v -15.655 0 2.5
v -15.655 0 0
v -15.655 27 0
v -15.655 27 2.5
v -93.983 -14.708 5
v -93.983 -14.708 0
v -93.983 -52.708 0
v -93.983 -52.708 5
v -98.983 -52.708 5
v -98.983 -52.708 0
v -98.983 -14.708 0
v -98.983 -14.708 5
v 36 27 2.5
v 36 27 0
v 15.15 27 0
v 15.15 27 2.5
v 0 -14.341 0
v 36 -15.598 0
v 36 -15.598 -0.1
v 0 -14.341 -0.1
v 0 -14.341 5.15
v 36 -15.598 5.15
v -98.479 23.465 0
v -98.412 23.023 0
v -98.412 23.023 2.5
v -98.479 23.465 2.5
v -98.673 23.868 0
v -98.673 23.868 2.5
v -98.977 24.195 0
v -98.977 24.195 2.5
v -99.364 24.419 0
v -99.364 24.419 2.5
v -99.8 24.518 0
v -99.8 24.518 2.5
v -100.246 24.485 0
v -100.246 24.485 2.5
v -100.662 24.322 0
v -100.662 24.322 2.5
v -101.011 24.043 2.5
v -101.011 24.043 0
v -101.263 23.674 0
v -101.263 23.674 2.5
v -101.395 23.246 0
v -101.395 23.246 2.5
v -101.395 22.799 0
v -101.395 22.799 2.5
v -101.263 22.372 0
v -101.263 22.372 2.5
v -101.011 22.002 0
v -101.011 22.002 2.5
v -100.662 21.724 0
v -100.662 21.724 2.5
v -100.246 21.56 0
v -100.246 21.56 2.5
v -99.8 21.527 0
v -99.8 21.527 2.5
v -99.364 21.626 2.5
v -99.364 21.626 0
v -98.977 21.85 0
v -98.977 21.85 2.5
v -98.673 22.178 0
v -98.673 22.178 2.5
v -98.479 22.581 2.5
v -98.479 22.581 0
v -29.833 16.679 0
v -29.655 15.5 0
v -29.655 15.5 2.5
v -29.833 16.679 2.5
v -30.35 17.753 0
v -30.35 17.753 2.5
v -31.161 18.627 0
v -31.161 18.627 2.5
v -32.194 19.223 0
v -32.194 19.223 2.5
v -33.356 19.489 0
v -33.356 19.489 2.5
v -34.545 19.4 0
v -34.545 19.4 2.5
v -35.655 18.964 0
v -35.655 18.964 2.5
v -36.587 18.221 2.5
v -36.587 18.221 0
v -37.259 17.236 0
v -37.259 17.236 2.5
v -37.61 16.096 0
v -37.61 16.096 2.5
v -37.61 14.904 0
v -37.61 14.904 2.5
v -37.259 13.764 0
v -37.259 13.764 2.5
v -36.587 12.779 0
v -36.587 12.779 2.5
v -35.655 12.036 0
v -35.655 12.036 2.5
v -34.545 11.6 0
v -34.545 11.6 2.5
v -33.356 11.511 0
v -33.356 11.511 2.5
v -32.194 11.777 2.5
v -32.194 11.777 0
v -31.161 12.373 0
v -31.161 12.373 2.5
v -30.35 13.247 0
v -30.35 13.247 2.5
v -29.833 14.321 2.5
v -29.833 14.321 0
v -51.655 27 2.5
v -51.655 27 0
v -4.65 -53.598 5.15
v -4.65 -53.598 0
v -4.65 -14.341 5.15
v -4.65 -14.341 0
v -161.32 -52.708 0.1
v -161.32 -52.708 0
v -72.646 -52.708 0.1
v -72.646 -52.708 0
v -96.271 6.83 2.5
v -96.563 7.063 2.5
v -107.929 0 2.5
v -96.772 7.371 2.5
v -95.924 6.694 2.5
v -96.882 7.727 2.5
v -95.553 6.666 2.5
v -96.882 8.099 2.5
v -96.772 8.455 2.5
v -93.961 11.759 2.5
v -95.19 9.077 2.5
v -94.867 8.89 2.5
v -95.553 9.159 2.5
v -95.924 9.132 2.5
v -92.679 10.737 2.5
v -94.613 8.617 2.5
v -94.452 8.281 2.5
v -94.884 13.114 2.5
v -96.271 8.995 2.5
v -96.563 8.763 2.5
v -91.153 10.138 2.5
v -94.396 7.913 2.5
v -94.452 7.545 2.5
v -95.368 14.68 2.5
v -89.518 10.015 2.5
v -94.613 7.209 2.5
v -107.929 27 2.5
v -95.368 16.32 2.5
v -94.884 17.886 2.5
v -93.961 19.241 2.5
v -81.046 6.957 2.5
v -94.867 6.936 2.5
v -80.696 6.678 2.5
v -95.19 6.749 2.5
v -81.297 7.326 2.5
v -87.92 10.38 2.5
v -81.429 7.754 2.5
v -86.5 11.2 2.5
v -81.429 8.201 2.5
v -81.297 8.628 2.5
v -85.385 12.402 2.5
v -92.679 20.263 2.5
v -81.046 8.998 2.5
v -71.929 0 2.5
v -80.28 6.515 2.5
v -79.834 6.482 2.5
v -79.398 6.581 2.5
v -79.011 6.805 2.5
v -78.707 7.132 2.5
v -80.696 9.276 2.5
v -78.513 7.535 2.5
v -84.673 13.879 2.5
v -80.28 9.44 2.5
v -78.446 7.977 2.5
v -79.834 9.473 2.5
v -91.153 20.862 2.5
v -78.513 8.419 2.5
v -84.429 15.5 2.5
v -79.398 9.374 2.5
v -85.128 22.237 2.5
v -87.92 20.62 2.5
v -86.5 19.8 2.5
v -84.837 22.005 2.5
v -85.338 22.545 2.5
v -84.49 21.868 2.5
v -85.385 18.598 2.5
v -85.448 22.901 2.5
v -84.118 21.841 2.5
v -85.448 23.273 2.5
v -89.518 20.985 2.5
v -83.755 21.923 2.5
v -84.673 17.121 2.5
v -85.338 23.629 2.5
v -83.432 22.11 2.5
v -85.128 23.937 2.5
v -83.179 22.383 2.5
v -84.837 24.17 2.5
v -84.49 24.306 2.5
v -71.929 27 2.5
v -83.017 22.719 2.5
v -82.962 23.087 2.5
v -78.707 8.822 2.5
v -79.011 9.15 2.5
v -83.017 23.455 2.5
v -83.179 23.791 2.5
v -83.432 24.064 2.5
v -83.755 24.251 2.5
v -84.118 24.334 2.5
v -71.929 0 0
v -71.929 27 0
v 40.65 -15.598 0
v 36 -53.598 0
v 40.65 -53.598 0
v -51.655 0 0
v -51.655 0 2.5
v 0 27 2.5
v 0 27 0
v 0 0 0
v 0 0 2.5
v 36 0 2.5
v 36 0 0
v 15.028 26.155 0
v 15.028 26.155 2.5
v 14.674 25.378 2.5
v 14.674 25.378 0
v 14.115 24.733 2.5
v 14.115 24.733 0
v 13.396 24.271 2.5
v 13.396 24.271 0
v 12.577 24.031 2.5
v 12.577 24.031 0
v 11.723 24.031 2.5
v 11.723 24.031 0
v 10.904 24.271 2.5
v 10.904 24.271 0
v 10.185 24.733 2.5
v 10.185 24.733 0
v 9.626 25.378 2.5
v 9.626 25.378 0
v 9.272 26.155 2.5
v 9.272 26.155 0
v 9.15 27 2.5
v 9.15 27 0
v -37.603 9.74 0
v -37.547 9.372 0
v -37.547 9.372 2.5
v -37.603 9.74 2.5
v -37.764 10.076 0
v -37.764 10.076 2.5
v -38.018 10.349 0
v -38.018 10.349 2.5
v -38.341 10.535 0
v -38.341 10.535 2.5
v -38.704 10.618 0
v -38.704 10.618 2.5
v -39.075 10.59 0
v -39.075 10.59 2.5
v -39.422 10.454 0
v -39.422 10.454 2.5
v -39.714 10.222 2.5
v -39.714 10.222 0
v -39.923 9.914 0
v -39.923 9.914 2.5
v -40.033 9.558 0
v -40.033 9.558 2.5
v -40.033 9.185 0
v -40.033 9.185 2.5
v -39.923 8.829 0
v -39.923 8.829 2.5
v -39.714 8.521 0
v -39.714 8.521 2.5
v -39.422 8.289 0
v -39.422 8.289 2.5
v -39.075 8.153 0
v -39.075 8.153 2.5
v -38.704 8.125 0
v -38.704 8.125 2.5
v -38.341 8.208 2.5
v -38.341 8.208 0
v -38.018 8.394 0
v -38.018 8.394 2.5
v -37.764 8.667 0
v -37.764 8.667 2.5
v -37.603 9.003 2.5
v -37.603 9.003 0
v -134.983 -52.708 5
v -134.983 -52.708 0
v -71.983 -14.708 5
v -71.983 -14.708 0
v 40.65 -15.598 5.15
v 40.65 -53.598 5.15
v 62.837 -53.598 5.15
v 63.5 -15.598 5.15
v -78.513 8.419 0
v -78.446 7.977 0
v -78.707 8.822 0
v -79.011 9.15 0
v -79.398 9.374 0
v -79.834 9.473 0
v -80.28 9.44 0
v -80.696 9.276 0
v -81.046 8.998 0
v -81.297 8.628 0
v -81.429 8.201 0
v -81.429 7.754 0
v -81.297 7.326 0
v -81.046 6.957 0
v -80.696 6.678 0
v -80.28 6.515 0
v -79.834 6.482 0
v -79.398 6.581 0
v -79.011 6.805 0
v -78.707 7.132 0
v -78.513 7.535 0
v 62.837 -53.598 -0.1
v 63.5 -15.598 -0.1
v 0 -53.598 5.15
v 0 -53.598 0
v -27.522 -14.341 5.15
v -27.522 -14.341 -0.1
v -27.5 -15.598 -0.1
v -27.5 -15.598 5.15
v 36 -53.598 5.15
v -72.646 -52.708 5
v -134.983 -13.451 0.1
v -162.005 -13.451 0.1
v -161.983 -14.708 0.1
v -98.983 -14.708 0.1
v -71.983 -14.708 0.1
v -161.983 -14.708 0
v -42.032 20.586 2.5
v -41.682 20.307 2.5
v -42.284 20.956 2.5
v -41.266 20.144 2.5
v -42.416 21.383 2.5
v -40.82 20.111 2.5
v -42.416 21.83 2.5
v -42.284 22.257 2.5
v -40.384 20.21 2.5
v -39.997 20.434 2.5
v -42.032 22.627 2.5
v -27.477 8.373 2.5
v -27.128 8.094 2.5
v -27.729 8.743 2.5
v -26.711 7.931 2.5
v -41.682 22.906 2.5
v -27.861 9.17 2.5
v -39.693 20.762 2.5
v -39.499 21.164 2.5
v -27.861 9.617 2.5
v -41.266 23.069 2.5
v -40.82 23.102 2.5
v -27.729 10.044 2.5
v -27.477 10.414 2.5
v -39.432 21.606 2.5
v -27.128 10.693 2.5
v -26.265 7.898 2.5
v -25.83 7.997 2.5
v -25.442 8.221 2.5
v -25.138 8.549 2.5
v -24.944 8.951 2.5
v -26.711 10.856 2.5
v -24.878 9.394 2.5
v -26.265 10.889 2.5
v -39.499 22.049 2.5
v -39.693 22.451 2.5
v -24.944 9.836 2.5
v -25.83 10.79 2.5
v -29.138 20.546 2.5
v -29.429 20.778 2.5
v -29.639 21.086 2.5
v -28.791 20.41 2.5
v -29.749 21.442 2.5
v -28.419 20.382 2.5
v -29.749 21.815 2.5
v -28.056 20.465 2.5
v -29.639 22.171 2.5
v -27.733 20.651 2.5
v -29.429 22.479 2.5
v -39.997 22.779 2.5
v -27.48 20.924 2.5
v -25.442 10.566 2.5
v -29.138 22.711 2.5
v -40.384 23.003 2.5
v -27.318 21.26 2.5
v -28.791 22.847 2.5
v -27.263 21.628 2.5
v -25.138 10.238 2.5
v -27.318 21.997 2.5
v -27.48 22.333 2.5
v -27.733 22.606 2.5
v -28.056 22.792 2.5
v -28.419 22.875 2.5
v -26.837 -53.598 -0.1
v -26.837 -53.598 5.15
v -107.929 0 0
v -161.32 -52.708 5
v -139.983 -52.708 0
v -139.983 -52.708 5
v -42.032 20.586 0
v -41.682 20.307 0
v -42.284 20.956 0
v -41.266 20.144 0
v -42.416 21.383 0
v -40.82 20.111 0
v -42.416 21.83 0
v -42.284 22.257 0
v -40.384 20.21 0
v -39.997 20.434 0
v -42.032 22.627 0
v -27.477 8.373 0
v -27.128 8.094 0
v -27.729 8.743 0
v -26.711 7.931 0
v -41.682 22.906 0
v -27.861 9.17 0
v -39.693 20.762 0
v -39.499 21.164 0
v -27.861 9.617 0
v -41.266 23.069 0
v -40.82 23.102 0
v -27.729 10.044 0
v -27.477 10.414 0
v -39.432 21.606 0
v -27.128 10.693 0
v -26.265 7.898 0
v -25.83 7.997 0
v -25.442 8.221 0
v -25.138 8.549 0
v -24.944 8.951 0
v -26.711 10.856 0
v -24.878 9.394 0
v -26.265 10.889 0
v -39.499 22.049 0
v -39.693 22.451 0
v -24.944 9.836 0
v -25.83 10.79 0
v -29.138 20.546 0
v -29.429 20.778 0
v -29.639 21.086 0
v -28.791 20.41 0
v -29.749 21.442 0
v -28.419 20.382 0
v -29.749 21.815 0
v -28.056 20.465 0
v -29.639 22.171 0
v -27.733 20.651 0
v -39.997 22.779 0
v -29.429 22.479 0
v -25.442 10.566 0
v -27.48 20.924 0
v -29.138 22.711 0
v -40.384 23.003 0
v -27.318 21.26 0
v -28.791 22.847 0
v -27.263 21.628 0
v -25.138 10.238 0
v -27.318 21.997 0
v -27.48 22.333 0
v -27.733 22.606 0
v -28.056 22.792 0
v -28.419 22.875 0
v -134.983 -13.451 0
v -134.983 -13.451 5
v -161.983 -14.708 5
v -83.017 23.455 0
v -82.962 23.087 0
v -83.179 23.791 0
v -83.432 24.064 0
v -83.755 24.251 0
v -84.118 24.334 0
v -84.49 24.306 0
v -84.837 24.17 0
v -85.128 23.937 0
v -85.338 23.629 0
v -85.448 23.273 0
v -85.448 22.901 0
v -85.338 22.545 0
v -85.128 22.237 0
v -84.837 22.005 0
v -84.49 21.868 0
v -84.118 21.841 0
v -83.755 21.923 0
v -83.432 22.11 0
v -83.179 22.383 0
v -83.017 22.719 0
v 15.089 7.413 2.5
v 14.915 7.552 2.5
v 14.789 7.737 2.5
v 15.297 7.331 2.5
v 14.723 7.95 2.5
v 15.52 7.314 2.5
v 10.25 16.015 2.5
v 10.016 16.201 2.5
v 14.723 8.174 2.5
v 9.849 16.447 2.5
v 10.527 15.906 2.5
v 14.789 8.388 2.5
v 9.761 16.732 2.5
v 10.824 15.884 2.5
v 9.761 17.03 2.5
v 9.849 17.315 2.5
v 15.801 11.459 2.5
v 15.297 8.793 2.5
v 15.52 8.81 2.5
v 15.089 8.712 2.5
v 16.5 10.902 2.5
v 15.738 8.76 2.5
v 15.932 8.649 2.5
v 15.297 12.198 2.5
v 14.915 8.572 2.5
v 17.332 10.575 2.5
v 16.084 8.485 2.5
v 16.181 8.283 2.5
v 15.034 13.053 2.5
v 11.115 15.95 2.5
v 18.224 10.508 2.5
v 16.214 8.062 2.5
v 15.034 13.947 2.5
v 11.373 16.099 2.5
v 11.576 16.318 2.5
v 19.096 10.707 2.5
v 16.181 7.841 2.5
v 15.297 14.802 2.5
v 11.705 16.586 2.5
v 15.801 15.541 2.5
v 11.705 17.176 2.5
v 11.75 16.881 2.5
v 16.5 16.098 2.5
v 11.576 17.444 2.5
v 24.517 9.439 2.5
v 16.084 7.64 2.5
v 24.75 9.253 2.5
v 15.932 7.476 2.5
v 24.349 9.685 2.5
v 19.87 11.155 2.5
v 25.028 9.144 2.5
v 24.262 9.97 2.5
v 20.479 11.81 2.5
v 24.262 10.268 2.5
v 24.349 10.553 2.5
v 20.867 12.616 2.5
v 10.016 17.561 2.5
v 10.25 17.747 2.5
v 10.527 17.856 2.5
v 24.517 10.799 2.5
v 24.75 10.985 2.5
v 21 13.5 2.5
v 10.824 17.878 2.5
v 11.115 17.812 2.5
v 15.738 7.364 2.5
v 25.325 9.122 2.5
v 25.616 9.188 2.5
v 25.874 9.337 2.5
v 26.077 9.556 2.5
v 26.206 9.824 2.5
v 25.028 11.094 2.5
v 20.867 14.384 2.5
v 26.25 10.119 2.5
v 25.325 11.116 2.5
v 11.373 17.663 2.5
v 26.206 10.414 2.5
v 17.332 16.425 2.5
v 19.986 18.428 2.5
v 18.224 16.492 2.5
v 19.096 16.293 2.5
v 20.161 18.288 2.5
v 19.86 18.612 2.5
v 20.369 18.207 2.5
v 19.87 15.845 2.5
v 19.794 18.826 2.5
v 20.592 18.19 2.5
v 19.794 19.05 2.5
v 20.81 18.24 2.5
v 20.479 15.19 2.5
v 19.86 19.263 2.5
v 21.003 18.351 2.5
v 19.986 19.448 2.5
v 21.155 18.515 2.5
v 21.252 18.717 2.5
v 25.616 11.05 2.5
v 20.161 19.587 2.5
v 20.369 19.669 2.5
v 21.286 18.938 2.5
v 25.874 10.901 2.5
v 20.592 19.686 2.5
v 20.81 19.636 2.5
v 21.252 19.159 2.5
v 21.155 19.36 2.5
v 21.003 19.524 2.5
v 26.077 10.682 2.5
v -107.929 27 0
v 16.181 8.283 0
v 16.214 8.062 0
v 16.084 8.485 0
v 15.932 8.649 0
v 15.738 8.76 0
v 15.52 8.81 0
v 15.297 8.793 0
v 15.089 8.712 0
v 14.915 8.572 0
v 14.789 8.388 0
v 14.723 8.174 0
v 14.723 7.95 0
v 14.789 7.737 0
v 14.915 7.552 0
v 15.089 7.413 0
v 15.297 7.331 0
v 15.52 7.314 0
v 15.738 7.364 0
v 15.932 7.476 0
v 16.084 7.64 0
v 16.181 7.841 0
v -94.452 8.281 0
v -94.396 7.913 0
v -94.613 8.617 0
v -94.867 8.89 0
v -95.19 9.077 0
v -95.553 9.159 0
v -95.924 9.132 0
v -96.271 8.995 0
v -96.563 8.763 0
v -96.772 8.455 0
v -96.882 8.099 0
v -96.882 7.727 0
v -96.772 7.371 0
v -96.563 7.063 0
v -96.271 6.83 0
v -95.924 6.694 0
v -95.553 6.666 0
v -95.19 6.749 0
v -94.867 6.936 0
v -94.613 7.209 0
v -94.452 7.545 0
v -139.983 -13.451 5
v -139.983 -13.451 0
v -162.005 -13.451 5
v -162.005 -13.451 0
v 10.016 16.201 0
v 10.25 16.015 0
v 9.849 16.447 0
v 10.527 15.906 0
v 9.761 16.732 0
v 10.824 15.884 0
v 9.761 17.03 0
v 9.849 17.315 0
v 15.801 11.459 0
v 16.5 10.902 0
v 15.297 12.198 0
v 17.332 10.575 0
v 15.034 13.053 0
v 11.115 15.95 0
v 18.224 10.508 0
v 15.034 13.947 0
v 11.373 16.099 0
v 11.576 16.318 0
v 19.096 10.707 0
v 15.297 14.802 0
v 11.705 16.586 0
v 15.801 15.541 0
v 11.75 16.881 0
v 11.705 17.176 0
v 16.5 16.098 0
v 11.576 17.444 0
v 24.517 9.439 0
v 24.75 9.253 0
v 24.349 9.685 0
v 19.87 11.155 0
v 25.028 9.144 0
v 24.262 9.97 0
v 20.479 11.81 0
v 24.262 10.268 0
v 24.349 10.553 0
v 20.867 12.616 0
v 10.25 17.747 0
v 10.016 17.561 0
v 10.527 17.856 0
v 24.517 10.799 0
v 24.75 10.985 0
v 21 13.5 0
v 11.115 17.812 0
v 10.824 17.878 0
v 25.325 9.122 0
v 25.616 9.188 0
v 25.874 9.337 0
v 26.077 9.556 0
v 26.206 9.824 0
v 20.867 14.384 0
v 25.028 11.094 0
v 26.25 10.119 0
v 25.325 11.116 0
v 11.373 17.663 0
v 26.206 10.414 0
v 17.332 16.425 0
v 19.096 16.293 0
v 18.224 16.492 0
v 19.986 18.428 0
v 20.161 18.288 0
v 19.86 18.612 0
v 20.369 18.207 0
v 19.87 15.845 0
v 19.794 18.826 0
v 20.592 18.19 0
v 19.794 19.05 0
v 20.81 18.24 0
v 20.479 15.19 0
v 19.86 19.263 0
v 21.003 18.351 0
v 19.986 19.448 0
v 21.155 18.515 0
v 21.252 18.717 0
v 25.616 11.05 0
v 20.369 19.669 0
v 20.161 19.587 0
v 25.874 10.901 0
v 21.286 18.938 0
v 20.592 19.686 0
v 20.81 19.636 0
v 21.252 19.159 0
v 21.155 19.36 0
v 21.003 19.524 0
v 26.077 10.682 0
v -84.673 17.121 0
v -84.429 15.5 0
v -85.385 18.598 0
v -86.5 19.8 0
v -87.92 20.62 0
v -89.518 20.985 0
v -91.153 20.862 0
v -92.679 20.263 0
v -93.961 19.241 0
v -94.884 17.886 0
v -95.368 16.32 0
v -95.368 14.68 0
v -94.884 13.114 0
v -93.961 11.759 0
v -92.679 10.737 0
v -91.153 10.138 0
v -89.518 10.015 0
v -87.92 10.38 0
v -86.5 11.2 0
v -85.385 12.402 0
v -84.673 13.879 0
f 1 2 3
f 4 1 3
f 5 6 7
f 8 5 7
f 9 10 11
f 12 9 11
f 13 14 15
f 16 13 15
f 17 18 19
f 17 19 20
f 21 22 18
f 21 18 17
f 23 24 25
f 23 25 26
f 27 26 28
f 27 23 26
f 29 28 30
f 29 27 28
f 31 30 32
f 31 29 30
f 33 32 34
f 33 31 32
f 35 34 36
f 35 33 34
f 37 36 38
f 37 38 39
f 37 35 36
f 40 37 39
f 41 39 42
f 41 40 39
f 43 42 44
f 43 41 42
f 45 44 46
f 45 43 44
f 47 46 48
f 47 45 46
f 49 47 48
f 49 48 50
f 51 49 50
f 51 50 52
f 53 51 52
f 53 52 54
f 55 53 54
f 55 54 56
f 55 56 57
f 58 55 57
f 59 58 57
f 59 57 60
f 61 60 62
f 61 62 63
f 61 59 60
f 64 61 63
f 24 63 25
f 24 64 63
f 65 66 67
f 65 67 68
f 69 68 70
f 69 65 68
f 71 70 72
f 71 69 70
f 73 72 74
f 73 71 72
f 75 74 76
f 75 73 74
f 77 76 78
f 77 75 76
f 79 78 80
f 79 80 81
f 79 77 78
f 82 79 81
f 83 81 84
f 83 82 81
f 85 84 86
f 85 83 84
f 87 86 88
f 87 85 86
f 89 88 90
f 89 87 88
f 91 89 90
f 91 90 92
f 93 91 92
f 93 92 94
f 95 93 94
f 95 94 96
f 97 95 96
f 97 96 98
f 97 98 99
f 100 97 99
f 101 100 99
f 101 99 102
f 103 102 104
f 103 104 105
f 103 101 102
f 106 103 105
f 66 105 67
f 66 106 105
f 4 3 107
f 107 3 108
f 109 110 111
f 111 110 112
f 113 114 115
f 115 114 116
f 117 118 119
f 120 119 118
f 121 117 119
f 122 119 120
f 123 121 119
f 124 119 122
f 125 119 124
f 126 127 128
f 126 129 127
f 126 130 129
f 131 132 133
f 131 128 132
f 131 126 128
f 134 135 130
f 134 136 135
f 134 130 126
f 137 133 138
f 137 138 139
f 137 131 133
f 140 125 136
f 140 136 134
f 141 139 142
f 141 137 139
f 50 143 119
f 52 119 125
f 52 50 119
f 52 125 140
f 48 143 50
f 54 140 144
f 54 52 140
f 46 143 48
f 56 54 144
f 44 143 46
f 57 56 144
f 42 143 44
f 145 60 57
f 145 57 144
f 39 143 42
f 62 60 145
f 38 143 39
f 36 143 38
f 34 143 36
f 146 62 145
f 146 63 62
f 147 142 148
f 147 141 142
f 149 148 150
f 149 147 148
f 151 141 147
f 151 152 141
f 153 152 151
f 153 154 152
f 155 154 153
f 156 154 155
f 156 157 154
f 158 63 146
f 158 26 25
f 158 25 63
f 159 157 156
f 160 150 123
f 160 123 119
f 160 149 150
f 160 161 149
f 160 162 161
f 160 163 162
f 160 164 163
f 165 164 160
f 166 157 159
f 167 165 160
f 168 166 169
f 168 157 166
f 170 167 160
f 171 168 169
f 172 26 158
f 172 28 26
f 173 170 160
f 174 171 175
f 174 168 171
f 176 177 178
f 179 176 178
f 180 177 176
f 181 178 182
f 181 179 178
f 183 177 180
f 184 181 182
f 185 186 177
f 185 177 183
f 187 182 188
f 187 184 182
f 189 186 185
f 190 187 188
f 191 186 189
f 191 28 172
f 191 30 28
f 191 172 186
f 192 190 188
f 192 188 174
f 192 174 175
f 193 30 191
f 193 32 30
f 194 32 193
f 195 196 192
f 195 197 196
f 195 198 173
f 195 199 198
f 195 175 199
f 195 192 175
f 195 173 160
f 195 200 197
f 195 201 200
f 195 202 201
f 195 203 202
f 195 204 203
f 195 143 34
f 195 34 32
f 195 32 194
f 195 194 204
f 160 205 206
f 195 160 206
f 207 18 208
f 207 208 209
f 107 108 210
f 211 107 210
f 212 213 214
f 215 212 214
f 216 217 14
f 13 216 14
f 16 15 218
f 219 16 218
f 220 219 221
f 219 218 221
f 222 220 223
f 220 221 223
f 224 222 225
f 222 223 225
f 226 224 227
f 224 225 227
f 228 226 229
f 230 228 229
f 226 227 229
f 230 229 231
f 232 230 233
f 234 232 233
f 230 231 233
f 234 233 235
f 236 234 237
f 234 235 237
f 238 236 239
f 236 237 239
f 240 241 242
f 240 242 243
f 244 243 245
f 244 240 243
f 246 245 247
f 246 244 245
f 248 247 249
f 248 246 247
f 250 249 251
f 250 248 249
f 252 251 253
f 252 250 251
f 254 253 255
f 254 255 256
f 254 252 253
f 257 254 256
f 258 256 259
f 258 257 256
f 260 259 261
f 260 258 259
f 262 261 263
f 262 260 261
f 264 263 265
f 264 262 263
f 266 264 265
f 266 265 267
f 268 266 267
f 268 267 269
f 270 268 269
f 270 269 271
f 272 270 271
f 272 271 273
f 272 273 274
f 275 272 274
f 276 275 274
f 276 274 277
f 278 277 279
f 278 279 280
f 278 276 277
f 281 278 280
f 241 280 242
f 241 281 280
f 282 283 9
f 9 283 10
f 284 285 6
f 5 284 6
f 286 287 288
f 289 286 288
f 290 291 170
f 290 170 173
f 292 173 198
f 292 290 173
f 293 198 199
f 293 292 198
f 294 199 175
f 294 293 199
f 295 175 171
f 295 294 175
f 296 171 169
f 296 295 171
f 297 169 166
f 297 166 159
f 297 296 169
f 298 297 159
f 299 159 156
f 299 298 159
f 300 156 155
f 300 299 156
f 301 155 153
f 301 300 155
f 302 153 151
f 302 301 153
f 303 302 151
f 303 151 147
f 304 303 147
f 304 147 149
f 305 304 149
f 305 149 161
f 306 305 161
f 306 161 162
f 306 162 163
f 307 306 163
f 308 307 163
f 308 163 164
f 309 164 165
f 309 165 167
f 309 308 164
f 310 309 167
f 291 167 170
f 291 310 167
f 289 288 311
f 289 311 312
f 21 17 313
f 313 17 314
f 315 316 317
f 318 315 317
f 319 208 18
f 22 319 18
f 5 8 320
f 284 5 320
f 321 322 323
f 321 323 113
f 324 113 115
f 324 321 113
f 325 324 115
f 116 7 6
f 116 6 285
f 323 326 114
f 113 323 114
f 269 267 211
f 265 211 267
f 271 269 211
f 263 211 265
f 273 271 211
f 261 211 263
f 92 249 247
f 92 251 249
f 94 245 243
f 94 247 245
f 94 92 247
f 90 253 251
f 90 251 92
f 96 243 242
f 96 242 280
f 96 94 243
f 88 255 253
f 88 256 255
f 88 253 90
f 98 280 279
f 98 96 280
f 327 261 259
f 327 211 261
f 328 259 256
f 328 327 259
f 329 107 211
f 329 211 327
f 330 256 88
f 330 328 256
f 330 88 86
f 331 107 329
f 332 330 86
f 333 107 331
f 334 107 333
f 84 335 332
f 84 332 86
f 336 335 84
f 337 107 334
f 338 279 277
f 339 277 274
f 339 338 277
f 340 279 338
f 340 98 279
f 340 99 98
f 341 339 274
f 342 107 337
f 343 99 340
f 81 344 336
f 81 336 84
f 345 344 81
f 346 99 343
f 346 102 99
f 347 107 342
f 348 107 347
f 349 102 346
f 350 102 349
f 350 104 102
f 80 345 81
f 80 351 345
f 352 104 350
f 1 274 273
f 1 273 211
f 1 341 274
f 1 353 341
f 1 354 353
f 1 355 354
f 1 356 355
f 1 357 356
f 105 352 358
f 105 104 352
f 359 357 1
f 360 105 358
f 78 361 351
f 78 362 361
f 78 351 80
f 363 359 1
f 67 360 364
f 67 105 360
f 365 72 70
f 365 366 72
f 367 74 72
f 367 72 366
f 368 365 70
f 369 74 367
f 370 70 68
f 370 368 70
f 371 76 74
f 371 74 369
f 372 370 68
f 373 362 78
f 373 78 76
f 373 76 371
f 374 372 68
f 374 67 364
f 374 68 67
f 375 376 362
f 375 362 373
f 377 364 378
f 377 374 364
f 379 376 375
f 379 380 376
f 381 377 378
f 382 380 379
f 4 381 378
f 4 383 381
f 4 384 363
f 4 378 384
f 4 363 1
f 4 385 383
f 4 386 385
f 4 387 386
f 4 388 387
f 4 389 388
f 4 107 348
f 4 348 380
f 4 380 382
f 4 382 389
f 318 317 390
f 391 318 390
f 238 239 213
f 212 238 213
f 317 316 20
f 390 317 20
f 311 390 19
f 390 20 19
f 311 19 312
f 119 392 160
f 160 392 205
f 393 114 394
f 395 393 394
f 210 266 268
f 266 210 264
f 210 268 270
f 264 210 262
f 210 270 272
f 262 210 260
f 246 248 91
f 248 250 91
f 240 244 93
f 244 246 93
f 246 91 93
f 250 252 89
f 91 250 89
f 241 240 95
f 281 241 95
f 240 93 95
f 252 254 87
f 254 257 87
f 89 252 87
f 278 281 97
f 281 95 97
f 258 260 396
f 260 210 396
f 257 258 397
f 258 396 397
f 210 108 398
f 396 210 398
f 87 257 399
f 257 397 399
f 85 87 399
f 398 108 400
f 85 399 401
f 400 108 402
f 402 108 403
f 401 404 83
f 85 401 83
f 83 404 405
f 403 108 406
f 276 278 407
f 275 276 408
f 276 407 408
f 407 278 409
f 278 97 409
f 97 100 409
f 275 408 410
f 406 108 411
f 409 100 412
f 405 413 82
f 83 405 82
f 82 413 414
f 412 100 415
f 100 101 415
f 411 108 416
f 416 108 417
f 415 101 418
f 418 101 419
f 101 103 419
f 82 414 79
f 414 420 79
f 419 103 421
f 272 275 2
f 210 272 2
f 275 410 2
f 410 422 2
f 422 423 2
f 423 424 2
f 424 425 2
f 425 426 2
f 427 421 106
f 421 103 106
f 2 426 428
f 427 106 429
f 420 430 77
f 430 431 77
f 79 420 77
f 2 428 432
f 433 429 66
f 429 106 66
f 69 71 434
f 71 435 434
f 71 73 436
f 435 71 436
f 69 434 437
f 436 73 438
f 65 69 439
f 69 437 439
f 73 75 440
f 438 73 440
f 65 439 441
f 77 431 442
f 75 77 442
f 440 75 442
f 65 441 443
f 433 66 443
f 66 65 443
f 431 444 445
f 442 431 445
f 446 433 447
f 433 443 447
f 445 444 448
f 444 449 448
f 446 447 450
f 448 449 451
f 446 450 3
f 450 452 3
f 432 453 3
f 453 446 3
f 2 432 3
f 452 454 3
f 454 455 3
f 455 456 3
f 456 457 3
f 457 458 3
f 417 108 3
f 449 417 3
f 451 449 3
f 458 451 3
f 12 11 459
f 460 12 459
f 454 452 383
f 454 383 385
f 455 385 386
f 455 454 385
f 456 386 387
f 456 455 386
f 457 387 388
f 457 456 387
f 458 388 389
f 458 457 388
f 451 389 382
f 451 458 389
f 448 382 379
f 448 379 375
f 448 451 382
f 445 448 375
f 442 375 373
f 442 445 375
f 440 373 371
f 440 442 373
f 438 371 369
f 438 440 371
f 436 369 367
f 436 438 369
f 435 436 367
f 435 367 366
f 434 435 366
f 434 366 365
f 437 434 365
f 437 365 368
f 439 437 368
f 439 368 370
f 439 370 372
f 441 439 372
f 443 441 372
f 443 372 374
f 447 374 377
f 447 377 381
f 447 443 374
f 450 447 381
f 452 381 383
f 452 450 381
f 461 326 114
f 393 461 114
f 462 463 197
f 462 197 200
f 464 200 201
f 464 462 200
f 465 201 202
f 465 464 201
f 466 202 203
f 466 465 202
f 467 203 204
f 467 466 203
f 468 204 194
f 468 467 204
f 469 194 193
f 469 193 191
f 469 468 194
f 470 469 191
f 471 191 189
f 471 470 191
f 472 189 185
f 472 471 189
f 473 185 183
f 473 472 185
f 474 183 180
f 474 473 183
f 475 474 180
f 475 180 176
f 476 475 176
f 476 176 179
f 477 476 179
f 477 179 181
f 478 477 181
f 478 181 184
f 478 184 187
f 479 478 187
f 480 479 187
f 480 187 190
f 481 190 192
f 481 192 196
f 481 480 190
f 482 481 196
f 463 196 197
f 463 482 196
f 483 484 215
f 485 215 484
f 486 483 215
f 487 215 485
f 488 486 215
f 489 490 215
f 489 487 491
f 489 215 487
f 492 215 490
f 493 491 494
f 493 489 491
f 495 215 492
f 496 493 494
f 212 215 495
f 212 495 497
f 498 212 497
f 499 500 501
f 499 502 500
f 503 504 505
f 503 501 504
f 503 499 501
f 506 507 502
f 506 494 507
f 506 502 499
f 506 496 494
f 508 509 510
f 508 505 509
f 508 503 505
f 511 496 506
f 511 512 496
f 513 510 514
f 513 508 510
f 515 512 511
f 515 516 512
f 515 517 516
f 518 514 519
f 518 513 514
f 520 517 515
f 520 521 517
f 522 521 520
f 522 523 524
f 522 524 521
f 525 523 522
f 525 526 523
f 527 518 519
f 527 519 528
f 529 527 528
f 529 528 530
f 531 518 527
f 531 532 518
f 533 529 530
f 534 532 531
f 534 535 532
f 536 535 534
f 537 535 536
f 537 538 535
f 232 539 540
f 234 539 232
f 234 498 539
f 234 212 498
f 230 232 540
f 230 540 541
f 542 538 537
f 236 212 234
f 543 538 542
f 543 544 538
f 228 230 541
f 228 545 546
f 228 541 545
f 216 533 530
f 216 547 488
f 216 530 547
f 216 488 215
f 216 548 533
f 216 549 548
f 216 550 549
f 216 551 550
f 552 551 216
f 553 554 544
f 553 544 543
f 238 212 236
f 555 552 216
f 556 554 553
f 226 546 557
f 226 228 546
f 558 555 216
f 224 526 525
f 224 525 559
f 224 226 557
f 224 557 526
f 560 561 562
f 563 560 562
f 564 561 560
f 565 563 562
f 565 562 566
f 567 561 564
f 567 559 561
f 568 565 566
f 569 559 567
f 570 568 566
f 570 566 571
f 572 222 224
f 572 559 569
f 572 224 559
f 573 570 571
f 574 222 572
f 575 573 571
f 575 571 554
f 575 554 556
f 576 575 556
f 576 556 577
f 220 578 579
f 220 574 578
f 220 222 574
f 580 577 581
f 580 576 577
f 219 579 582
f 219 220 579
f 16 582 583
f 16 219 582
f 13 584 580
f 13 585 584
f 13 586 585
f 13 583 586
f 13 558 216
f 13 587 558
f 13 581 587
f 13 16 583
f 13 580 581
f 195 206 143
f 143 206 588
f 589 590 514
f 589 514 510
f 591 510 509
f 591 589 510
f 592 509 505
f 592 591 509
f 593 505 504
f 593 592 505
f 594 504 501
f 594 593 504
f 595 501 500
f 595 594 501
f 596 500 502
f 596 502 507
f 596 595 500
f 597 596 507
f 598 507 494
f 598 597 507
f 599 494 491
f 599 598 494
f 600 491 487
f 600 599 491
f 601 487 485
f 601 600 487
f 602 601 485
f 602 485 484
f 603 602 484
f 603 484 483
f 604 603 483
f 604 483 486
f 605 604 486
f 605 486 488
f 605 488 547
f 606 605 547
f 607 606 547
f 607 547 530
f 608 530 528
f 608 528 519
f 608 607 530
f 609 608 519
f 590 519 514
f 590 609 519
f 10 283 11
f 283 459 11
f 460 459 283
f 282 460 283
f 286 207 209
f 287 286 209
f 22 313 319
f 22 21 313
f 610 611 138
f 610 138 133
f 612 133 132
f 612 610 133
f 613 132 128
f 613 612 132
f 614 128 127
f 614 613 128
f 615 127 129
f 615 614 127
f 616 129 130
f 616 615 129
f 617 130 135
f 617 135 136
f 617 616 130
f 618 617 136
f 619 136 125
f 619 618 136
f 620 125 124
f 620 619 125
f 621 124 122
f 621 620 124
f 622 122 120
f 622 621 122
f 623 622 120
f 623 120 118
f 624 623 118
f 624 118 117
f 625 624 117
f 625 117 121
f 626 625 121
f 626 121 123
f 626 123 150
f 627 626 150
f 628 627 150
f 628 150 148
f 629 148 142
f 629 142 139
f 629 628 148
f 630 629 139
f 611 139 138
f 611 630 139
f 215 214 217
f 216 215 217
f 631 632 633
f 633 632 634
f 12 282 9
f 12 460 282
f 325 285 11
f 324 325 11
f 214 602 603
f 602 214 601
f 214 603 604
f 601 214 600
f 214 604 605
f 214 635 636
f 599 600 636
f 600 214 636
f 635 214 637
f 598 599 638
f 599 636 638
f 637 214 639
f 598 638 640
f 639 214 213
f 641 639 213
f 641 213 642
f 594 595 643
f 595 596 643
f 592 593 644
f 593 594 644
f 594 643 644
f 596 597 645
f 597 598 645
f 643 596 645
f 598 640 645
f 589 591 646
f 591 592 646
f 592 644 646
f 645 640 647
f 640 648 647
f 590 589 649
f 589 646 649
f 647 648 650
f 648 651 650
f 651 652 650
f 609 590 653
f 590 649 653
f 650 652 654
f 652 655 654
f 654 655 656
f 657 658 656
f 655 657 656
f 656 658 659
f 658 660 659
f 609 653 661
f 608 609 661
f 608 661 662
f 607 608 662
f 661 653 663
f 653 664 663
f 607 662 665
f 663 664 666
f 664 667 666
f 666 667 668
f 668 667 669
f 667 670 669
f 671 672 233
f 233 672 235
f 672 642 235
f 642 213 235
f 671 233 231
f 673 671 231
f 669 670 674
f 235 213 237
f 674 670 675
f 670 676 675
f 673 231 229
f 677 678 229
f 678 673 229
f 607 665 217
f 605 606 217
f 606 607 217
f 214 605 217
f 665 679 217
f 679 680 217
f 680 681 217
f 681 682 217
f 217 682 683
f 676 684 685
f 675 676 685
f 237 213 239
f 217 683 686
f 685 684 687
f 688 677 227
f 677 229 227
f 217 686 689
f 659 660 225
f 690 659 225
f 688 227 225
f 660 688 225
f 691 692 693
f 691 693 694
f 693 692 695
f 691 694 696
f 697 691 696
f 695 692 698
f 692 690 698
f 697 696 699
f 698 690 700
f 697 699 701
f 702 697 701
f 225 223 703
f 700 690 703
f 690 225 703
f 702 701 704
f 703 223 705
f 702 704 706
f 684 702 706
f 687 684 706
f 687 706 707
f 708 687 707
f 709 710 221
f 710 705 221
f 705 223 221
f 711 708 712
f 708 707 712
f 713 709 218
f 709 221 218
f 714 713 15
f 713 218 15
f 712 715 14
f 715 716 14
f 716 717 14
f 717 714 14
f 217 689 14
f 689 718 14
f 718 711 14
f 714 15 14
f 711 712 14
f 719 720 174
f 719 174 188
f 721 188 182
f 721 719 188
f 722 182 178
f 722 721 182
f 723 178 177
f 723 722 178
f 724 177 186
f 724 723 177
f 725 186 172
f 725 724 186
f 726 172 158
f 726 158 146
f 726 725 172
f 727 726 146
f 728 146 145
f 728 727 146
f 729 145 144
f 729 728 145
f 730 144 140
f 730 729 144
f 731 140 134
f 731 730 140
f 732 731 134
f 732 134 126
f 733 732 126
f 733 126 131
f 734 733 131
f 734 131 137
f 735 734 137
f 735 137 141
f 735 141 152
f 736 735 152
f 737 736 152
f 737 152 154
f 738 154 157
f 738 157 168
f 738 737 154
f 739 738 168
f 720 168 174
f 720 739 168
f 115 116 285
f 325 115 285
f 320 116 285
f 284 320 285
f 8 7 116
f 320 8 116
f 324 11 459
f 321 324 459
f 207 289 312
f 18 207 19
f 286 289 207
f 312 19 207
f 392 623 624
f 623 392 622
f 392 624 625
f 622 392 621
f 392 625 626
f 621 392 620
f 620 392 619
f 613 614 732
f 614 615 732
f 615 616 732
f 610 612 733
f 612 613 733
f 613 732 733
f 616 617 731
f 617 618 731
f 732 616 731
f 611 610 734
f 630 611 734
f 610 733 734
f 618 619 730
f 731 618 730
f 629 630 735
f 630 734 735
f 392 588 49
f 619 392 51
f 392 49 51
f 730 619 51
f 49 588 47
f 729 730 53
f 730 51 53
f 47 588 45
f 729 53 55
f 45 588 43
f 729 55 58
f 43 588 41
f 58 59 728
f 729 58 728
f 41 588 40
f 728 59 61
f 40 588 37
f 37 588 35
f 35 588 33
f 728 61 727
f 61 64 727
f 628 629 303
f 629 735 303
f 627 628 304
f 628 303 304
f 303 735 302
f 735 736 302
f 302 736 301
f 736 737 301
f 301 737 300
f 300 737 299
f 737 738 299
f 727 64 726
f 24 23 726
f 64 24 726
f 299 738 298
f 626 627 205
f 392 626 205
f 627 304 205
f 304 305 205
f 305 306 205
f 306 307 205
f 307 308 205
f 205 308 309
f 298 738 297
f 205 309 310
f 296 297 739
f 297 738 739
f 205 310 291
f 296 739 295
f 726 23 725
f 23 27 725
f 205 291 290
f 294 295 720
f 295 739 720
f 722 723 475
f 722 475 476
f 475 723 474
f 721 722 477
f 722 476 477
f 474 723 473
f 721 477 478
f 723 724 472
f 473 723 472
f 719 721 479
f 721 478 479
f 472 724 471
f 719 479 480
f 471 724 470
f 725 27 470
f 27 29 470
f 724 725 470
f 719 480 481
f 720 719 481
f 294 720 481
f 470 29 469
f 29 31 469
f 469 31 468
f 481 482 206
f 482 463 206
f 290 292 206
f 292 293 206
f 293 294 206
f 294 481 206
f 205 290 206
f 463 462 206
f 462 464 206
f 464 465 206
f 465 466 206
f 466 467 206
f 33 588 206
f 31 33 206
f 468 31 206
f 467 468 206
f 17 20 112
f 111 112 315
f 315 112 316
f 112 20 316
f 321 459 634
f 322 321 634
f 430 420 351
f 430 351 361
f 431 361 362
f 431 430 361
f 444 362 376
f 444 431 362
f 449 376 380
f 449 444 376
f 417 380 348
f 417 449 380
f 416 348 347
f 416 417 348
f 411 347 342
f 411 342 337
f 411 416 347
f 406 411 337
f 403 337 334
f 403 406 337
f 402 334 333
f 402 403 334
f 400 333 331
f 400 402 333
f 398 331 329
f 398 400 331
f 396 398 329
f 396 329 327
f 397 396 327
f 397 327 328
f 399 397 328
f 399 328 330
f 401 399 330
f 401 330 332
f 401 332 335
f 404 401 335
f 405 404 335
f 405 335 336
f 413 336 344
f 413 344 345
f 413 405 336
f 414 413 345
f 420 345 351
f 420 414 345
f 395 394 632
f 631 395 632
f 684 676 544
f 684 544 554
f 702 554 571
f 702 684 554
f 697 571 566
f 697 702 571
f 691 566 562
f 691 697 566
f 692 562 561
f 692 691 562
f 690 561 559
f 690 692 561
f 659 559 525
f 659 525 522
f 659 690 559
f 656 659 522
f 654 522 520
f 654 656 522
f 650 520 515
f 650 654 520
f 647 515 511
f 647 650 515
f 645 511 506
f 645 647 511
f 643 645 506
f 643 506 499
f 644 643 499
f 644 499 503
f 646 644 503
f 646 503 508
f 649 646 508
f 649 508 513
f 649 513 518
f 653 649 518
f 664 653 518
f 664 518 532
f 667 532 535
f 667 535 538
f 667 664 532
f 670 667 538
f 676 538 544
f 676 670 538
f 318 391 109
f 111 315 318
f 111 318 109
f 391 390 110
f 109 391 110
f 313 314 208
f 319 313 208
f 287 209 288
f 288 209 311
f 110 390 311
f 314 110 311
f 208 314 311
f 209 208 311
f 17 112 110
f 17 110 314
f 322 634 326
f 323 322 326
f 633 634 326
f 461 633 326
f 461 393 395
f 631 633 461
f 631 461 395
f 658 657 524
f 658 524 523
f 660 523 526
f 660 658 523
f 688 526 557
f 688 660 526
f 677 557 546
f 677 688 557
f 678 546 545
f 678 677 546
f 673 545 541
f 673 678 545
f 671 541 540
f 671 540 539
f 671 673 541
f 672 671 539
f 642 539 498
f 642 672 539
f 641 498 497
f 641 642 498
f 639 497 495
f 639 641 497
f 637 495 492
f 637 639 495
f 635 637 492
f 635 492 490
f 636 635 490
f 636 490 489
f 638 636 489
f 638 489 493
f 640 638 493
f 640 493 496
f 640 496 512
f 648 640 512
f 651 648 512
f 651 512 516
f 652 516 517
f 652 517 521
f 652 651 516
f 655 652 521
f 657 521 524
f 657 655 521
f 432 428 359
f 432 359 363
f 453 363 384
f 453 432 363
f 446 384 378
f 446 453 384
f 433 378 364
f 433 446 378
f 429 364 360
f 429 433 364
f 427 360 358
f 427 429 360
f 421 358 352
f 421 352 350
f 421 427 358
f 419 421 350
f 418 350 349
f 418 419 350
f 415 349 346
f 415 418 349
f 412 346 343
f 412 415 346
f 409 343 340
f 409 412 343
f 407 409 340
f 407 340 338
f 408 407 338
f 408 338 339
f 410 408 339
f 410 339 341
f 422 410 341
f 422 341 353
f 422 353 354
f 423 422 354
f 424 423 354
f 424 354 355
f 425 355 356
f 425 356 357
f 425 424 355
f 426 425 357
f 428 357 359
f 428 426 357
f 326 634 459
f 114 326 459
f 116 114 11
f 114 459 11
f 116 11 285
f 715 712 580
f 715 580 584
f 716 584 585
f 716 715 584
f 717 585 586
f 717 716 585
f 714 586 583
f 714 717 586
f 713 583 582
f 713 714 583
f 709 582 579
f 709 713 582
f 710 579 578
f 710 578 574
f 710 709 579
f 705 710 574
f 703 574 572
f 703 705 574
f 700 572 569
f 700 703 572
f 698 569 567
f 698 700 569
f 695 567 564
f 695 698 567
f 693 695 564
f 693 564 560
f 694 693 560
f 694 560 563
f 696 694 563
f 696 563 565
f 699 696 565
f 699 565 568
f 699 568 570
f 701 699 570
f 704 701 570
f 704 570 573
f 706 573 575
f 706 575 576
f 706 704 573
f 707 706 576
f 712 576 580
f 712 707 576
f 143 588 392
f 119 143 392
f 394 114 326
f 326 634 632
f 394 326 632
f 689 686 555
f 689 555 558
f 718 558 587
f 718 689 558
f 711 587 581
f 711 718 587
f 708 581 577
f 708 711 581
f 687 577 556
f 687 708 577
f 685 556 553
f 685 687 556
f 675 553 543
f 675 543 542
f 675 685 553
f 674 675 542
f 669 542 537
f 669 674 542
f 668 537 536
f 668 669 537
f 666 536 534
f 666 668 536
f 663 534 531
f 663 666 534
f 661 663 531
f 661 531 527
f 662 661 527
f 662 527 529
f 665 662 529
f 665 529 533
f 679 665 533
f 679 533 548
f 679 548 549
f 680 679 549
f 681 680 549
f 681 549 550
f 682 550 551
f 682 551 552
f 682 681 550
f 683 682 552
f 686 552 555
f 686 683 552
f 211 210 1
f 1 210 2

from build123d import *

# Parameters (mm, degrees)
F2_R      = 0.75
F2_R_2    = 1
F2_R_3    = 3
F7_DEPTH  = 2.5
F3_R      = 1.25
F3_R_2    = 1.5
F3_R_3    = 4
F4_R      = 1.25
F4_R_2    = 1.5
F4_R_3    = 5.5
F6_W      = 4.65
F6_H      = 38
F8_DEPTH  = 0.1
F9_DEPTH  = 5.15
F5_W      = 5
F5_H      = 38
F10_DEPTH = 0.1
F11_DEPTH = 5


with BuildPart() as f7:
    # F2 (on Top) → F7 (new body)
    with BuildSketch(Plane.XY):
        with BuildLine():
            Line((0, 27), (0, 0))
            Line((0, 0), (36, 0))
            Line((36, 0), (36, 27))
            Line((36, 27), (30.85, 27))
            Line((30.85, 27), (15.15, 27))
            ThreePointArc((15.15, 27), (12.15, 24), (9.15, 27))
            Line((9.15, 27), (0, 27))
        make_face()
        with Locations((15.4642904296, 8.0621532778)):
            Circle(F2_R, mode=Mode.SUBTRACT)
        with Locations((25.2504622963, 10.1190539061)):
            Circle(F2_R_2, mode=Mode.SUBTRACT)
        with Locations((10.7495377037, 16.8809460939)):
            Circle(F2_R_2, mode=Mode.SUBTRACT)
        with Locations((18, 13.5)):
            Circle(F2_R_3, mode=Mode.SUBTRACT)
        with Locations((20.5357095704, 18.9378467222)):
            Circle(F2_R, mode=Mode.SUBTRACT)
    extrude(amount=F7_DEPTH)


with BuildPart() as f7b:
    # F3 (on Top) → F7, piece 2 (new body)
    with BuildSketch(Plane.XY):
        with BuildLine():
            Line((-51.6549531966, 27), (-51.6549531966, 0))
            Line((-51.6549531966, 0), (-15.6549531966, 0))
            Line((-15.6549531966, 0), (-15.6549531966, 27))
            Line((-15.6549531966, 27), (-20.8049531966, 27))
            Line((-20.8049531966, 27), (-32.0049531966, 27))
            ThreePointArc((-32.0049531966, 27), (-35.5049531966, 23.5), (-39.0049531966, 27))
            Line((-39.0049531966, 27), (-51.6549531966, 27))
        make_face()
        with Locations((-38.7972540741, 9.371644455)):
            Circle(F3_R, mode=Mode.SUBTRACT)
        with Locations((-26.377530987, 9.393517708)):
            Circle(F3_R_2, mode=Mode.SUBTRACT)
        with Locations((-40.9323754063, 21.606482292)):
            Circle(F3_R_2, mode=Mode.SUBTRACT)
        with Locations((-33.6549531966, 15.5)):
            Circle(F3_R_3, mode=Mode.SUBTRACT)
        with Locations((-28.5126523192, 21.628355545)):
            Circle(F3_R, mode=Mode.SUBTRACT)
        with BuildLine():
            Line((-32.0049531966, 27), (-39.0049531966, 27))
            ThreePointArc((-39.0049531966, 27), (-35.5049531966, 23.5), (-32.0049531966, 27))
        make_face()
    extrude(amount=F7_DEPTH)


with BuildPart() as f7c:
    # F4 (on Top) → F7, piece 3 (new body)
    with BuildSketch(Plane.XY):
        with BuildLine():
            Line((-107.9289556146, 27), (-107.9289556146, 0))
            Line((-107.9289556146, 0), (-71.9289556146, 0))
            Line((-71.9289556146, 0), (-71.9289556146, 27))
            Line((-71.9289556146, 27), (-77.0789556146, 27))
            Line((-77.0789556146, 27), (-88.7789556146, 27))
            ThreePointArc((-88.7789556146, 27), (-92.7789556146, 23), (-96.7789556146, 27))
            Line((-96.7789556146, 27), (-107.9289556146, 27))
        make_face()
        with Locations((-95.6461983345, 7.9129626546)):
            Circle(F4_R, mode=Mode.SUBTRACT)
        with Locations((-79.946011739, 7.9773122106)):
            Circle(F4_R_2, mode=Mode.SUBTRACT)
        with Locations((-99.9118994902, 23.0226877894)):
            Circle(F4_R_2, mode=Mode.SUBTRACT)
        with Locations((-89.9289556146, 15.5)):
            Circle(F4_R_3, mode=Mode.SUBTRACT)
        with Locations((-84.2117128946, 23.0870373454)):
            Circle(F4_R, mode=Mode.SUBTRACT)
        with BuildLine():
            Line((-88.7789556146, 27), (-96.7789556146, 27))
            ThreePointArc((-96.7789556146, 27), (-92.7789556146, 23), (-88.7789556146, 27))
        make_face()
    extrude(amount=F7_DEPTH)


with BuildPart() as f8:
    # F6 (on Top) → F8 (new body)
    with BuildSketch(Plane.XY):
        Polygon((-26.8367075327, -53.5980651379), (-4.65, -53.5980651379), (-4.65, -15.5980651379), (-4.65, -14.3409174362), (-27.5, -14.3409174362), (-27.5219435948, -14.3409174362), (-27.5, -15.5980651379), align=None)
        Polygon((-4.65, -53.5980651379), (0, -53.5980651379), (0, -15.5980651379), (0, -14.3409174362), (-4.65, -14.3409174362), (-4.65, -15.5980651379), align=None)
        Polygon((0, -15.5980651379), (0, -53.5980651379), (36, -53.5980651379), (36, -15.5980651379), (0, -14.3409174362), align=None)
        with Locations((38.325, -34.5980651379)):
            Rectangle(F6_W, F6_H)
        Polygon((40.65, -15.5980651379), (40.65, -53.5980651379), (62.8367075327, -53.5980651379), (63.5, -15.5980651379), align=None)
    extrude(amount=-F8_DEPTH)

    # F6 (on Top) → F9 (join)
    with BuildSketch(Plane.XY):
        Polygon((-26.8367075327, -53.5980651379), (-4.65, -53.5980651379), (-4.65, -15.5980651379), (-4.65, -14.3409174362), (-27.5, -14.3409174362), (-27.5219435948, -14.3409174362), (-27.5, -15.5980651379), align=None)
        Polygon((0, -15.5980651379), (0, -53.5980651379), (36, -53.5980651379), (36, -15.5980651379), (0, -14.3409174362), align=None)
        Polygon((40.65, -15.5980651379), (40.65, -53.5980651379), (62.8367075327, -53.5980651379), (63.5, -15.5980651379), align=None)
    extrude(amount=F9_DEPTH)


with BuildPart() as f10:
    # F5 (on Top) → F10 (new body)
    with BuildSketch(Plane.XY):
        Polygon((-139.9830095768, -52.7081678733), (-134.9830095768, -52.7081678733), (-134.9830095768, -14.7081678733), (-134.9830095768, -13.4510201716), (-139.9830095768, -13.4510201716), (-139.9830095768, -14.7081678733), align=None)
        with Locations((-96.4830095768, -33.7081678733)):
            Rectangle(F5_W, F5_H)
        Polygon((-161.3197171095, -52.7081678733), (-139.9830095768, -52.7081678733), (-139.9830095768, -14.7081678733), (-139.9830095768, -13.4510201716), (-161.9830095768, -13.4510201716), (-162.0049531716, -13.4510201716), (-161.9830095768, -14.7081678733), align=None)
        Polygon((-134.9830095768, -14.7081678733), (-134.9830095768, -52.7081678733), (-98.9830095768, -52.7081678733), (-98.9830095768, -14.7081678733), (-134.9830095768, -13.4510201716), align=None)
        Polygon((-93.9830095768, -14.7081678733), (-93.9830095768, -52.7081678733), (-72.6463020441, -52.7081678733), (-71.9830095768, -14.7081678733), align=None)
    extrude(amount=F10_DEPTH)


with BuildPart() as f11:
    # F5 (on Top) → F11 (new body)
    with BuildSketch(Plane.XY):
        Polygon((-161.3197171095, -52.7081678733), (-139.9830095768, -52.7081678733), (-139.9830095768, -14.7081678733), (-139.9830095768, -13.4510201716), (-161.9830095768, -13.4510201716), (-162.0049531716, -13.4510201716), (-161.9830095768, -14.7081678733), align=None)
    extrude(amount=F11_DEPTH)


with BuildPart() as f11b:
    # F5 (on Top) → F11, piece 2 (new body)
    with BuildSketch(Plane.XY):
        Polygon((-134.9830095768, -14.7081678733), (-134.9830095768, -52.7081678733), (-98.9830095768, -52.7081678733), (-98.9830095768, -14.7081678733), (-134.9830095768, -13.4510201716), align=None)
    extrude(amount=F11_DEPTH)


with BuildPart() as f11c:
    # F5 (on Top) → F11, piece 3 (new body)
    with BuildSketch(Plane.XY):
        Polygon((-93.9830095768, -14.7081678733), (-93.9830095768, -52.7081678733), (-72.6463020441, -52.7081678733), (-71.9830095768, -14.7081678733), align=None)
    extrude(amount=F11_DEPTH)


solid = Compound([f7.part, f7b.part, f7c.part, f8.part, f10.part, f11.part, f11b.part, f11c.part])
